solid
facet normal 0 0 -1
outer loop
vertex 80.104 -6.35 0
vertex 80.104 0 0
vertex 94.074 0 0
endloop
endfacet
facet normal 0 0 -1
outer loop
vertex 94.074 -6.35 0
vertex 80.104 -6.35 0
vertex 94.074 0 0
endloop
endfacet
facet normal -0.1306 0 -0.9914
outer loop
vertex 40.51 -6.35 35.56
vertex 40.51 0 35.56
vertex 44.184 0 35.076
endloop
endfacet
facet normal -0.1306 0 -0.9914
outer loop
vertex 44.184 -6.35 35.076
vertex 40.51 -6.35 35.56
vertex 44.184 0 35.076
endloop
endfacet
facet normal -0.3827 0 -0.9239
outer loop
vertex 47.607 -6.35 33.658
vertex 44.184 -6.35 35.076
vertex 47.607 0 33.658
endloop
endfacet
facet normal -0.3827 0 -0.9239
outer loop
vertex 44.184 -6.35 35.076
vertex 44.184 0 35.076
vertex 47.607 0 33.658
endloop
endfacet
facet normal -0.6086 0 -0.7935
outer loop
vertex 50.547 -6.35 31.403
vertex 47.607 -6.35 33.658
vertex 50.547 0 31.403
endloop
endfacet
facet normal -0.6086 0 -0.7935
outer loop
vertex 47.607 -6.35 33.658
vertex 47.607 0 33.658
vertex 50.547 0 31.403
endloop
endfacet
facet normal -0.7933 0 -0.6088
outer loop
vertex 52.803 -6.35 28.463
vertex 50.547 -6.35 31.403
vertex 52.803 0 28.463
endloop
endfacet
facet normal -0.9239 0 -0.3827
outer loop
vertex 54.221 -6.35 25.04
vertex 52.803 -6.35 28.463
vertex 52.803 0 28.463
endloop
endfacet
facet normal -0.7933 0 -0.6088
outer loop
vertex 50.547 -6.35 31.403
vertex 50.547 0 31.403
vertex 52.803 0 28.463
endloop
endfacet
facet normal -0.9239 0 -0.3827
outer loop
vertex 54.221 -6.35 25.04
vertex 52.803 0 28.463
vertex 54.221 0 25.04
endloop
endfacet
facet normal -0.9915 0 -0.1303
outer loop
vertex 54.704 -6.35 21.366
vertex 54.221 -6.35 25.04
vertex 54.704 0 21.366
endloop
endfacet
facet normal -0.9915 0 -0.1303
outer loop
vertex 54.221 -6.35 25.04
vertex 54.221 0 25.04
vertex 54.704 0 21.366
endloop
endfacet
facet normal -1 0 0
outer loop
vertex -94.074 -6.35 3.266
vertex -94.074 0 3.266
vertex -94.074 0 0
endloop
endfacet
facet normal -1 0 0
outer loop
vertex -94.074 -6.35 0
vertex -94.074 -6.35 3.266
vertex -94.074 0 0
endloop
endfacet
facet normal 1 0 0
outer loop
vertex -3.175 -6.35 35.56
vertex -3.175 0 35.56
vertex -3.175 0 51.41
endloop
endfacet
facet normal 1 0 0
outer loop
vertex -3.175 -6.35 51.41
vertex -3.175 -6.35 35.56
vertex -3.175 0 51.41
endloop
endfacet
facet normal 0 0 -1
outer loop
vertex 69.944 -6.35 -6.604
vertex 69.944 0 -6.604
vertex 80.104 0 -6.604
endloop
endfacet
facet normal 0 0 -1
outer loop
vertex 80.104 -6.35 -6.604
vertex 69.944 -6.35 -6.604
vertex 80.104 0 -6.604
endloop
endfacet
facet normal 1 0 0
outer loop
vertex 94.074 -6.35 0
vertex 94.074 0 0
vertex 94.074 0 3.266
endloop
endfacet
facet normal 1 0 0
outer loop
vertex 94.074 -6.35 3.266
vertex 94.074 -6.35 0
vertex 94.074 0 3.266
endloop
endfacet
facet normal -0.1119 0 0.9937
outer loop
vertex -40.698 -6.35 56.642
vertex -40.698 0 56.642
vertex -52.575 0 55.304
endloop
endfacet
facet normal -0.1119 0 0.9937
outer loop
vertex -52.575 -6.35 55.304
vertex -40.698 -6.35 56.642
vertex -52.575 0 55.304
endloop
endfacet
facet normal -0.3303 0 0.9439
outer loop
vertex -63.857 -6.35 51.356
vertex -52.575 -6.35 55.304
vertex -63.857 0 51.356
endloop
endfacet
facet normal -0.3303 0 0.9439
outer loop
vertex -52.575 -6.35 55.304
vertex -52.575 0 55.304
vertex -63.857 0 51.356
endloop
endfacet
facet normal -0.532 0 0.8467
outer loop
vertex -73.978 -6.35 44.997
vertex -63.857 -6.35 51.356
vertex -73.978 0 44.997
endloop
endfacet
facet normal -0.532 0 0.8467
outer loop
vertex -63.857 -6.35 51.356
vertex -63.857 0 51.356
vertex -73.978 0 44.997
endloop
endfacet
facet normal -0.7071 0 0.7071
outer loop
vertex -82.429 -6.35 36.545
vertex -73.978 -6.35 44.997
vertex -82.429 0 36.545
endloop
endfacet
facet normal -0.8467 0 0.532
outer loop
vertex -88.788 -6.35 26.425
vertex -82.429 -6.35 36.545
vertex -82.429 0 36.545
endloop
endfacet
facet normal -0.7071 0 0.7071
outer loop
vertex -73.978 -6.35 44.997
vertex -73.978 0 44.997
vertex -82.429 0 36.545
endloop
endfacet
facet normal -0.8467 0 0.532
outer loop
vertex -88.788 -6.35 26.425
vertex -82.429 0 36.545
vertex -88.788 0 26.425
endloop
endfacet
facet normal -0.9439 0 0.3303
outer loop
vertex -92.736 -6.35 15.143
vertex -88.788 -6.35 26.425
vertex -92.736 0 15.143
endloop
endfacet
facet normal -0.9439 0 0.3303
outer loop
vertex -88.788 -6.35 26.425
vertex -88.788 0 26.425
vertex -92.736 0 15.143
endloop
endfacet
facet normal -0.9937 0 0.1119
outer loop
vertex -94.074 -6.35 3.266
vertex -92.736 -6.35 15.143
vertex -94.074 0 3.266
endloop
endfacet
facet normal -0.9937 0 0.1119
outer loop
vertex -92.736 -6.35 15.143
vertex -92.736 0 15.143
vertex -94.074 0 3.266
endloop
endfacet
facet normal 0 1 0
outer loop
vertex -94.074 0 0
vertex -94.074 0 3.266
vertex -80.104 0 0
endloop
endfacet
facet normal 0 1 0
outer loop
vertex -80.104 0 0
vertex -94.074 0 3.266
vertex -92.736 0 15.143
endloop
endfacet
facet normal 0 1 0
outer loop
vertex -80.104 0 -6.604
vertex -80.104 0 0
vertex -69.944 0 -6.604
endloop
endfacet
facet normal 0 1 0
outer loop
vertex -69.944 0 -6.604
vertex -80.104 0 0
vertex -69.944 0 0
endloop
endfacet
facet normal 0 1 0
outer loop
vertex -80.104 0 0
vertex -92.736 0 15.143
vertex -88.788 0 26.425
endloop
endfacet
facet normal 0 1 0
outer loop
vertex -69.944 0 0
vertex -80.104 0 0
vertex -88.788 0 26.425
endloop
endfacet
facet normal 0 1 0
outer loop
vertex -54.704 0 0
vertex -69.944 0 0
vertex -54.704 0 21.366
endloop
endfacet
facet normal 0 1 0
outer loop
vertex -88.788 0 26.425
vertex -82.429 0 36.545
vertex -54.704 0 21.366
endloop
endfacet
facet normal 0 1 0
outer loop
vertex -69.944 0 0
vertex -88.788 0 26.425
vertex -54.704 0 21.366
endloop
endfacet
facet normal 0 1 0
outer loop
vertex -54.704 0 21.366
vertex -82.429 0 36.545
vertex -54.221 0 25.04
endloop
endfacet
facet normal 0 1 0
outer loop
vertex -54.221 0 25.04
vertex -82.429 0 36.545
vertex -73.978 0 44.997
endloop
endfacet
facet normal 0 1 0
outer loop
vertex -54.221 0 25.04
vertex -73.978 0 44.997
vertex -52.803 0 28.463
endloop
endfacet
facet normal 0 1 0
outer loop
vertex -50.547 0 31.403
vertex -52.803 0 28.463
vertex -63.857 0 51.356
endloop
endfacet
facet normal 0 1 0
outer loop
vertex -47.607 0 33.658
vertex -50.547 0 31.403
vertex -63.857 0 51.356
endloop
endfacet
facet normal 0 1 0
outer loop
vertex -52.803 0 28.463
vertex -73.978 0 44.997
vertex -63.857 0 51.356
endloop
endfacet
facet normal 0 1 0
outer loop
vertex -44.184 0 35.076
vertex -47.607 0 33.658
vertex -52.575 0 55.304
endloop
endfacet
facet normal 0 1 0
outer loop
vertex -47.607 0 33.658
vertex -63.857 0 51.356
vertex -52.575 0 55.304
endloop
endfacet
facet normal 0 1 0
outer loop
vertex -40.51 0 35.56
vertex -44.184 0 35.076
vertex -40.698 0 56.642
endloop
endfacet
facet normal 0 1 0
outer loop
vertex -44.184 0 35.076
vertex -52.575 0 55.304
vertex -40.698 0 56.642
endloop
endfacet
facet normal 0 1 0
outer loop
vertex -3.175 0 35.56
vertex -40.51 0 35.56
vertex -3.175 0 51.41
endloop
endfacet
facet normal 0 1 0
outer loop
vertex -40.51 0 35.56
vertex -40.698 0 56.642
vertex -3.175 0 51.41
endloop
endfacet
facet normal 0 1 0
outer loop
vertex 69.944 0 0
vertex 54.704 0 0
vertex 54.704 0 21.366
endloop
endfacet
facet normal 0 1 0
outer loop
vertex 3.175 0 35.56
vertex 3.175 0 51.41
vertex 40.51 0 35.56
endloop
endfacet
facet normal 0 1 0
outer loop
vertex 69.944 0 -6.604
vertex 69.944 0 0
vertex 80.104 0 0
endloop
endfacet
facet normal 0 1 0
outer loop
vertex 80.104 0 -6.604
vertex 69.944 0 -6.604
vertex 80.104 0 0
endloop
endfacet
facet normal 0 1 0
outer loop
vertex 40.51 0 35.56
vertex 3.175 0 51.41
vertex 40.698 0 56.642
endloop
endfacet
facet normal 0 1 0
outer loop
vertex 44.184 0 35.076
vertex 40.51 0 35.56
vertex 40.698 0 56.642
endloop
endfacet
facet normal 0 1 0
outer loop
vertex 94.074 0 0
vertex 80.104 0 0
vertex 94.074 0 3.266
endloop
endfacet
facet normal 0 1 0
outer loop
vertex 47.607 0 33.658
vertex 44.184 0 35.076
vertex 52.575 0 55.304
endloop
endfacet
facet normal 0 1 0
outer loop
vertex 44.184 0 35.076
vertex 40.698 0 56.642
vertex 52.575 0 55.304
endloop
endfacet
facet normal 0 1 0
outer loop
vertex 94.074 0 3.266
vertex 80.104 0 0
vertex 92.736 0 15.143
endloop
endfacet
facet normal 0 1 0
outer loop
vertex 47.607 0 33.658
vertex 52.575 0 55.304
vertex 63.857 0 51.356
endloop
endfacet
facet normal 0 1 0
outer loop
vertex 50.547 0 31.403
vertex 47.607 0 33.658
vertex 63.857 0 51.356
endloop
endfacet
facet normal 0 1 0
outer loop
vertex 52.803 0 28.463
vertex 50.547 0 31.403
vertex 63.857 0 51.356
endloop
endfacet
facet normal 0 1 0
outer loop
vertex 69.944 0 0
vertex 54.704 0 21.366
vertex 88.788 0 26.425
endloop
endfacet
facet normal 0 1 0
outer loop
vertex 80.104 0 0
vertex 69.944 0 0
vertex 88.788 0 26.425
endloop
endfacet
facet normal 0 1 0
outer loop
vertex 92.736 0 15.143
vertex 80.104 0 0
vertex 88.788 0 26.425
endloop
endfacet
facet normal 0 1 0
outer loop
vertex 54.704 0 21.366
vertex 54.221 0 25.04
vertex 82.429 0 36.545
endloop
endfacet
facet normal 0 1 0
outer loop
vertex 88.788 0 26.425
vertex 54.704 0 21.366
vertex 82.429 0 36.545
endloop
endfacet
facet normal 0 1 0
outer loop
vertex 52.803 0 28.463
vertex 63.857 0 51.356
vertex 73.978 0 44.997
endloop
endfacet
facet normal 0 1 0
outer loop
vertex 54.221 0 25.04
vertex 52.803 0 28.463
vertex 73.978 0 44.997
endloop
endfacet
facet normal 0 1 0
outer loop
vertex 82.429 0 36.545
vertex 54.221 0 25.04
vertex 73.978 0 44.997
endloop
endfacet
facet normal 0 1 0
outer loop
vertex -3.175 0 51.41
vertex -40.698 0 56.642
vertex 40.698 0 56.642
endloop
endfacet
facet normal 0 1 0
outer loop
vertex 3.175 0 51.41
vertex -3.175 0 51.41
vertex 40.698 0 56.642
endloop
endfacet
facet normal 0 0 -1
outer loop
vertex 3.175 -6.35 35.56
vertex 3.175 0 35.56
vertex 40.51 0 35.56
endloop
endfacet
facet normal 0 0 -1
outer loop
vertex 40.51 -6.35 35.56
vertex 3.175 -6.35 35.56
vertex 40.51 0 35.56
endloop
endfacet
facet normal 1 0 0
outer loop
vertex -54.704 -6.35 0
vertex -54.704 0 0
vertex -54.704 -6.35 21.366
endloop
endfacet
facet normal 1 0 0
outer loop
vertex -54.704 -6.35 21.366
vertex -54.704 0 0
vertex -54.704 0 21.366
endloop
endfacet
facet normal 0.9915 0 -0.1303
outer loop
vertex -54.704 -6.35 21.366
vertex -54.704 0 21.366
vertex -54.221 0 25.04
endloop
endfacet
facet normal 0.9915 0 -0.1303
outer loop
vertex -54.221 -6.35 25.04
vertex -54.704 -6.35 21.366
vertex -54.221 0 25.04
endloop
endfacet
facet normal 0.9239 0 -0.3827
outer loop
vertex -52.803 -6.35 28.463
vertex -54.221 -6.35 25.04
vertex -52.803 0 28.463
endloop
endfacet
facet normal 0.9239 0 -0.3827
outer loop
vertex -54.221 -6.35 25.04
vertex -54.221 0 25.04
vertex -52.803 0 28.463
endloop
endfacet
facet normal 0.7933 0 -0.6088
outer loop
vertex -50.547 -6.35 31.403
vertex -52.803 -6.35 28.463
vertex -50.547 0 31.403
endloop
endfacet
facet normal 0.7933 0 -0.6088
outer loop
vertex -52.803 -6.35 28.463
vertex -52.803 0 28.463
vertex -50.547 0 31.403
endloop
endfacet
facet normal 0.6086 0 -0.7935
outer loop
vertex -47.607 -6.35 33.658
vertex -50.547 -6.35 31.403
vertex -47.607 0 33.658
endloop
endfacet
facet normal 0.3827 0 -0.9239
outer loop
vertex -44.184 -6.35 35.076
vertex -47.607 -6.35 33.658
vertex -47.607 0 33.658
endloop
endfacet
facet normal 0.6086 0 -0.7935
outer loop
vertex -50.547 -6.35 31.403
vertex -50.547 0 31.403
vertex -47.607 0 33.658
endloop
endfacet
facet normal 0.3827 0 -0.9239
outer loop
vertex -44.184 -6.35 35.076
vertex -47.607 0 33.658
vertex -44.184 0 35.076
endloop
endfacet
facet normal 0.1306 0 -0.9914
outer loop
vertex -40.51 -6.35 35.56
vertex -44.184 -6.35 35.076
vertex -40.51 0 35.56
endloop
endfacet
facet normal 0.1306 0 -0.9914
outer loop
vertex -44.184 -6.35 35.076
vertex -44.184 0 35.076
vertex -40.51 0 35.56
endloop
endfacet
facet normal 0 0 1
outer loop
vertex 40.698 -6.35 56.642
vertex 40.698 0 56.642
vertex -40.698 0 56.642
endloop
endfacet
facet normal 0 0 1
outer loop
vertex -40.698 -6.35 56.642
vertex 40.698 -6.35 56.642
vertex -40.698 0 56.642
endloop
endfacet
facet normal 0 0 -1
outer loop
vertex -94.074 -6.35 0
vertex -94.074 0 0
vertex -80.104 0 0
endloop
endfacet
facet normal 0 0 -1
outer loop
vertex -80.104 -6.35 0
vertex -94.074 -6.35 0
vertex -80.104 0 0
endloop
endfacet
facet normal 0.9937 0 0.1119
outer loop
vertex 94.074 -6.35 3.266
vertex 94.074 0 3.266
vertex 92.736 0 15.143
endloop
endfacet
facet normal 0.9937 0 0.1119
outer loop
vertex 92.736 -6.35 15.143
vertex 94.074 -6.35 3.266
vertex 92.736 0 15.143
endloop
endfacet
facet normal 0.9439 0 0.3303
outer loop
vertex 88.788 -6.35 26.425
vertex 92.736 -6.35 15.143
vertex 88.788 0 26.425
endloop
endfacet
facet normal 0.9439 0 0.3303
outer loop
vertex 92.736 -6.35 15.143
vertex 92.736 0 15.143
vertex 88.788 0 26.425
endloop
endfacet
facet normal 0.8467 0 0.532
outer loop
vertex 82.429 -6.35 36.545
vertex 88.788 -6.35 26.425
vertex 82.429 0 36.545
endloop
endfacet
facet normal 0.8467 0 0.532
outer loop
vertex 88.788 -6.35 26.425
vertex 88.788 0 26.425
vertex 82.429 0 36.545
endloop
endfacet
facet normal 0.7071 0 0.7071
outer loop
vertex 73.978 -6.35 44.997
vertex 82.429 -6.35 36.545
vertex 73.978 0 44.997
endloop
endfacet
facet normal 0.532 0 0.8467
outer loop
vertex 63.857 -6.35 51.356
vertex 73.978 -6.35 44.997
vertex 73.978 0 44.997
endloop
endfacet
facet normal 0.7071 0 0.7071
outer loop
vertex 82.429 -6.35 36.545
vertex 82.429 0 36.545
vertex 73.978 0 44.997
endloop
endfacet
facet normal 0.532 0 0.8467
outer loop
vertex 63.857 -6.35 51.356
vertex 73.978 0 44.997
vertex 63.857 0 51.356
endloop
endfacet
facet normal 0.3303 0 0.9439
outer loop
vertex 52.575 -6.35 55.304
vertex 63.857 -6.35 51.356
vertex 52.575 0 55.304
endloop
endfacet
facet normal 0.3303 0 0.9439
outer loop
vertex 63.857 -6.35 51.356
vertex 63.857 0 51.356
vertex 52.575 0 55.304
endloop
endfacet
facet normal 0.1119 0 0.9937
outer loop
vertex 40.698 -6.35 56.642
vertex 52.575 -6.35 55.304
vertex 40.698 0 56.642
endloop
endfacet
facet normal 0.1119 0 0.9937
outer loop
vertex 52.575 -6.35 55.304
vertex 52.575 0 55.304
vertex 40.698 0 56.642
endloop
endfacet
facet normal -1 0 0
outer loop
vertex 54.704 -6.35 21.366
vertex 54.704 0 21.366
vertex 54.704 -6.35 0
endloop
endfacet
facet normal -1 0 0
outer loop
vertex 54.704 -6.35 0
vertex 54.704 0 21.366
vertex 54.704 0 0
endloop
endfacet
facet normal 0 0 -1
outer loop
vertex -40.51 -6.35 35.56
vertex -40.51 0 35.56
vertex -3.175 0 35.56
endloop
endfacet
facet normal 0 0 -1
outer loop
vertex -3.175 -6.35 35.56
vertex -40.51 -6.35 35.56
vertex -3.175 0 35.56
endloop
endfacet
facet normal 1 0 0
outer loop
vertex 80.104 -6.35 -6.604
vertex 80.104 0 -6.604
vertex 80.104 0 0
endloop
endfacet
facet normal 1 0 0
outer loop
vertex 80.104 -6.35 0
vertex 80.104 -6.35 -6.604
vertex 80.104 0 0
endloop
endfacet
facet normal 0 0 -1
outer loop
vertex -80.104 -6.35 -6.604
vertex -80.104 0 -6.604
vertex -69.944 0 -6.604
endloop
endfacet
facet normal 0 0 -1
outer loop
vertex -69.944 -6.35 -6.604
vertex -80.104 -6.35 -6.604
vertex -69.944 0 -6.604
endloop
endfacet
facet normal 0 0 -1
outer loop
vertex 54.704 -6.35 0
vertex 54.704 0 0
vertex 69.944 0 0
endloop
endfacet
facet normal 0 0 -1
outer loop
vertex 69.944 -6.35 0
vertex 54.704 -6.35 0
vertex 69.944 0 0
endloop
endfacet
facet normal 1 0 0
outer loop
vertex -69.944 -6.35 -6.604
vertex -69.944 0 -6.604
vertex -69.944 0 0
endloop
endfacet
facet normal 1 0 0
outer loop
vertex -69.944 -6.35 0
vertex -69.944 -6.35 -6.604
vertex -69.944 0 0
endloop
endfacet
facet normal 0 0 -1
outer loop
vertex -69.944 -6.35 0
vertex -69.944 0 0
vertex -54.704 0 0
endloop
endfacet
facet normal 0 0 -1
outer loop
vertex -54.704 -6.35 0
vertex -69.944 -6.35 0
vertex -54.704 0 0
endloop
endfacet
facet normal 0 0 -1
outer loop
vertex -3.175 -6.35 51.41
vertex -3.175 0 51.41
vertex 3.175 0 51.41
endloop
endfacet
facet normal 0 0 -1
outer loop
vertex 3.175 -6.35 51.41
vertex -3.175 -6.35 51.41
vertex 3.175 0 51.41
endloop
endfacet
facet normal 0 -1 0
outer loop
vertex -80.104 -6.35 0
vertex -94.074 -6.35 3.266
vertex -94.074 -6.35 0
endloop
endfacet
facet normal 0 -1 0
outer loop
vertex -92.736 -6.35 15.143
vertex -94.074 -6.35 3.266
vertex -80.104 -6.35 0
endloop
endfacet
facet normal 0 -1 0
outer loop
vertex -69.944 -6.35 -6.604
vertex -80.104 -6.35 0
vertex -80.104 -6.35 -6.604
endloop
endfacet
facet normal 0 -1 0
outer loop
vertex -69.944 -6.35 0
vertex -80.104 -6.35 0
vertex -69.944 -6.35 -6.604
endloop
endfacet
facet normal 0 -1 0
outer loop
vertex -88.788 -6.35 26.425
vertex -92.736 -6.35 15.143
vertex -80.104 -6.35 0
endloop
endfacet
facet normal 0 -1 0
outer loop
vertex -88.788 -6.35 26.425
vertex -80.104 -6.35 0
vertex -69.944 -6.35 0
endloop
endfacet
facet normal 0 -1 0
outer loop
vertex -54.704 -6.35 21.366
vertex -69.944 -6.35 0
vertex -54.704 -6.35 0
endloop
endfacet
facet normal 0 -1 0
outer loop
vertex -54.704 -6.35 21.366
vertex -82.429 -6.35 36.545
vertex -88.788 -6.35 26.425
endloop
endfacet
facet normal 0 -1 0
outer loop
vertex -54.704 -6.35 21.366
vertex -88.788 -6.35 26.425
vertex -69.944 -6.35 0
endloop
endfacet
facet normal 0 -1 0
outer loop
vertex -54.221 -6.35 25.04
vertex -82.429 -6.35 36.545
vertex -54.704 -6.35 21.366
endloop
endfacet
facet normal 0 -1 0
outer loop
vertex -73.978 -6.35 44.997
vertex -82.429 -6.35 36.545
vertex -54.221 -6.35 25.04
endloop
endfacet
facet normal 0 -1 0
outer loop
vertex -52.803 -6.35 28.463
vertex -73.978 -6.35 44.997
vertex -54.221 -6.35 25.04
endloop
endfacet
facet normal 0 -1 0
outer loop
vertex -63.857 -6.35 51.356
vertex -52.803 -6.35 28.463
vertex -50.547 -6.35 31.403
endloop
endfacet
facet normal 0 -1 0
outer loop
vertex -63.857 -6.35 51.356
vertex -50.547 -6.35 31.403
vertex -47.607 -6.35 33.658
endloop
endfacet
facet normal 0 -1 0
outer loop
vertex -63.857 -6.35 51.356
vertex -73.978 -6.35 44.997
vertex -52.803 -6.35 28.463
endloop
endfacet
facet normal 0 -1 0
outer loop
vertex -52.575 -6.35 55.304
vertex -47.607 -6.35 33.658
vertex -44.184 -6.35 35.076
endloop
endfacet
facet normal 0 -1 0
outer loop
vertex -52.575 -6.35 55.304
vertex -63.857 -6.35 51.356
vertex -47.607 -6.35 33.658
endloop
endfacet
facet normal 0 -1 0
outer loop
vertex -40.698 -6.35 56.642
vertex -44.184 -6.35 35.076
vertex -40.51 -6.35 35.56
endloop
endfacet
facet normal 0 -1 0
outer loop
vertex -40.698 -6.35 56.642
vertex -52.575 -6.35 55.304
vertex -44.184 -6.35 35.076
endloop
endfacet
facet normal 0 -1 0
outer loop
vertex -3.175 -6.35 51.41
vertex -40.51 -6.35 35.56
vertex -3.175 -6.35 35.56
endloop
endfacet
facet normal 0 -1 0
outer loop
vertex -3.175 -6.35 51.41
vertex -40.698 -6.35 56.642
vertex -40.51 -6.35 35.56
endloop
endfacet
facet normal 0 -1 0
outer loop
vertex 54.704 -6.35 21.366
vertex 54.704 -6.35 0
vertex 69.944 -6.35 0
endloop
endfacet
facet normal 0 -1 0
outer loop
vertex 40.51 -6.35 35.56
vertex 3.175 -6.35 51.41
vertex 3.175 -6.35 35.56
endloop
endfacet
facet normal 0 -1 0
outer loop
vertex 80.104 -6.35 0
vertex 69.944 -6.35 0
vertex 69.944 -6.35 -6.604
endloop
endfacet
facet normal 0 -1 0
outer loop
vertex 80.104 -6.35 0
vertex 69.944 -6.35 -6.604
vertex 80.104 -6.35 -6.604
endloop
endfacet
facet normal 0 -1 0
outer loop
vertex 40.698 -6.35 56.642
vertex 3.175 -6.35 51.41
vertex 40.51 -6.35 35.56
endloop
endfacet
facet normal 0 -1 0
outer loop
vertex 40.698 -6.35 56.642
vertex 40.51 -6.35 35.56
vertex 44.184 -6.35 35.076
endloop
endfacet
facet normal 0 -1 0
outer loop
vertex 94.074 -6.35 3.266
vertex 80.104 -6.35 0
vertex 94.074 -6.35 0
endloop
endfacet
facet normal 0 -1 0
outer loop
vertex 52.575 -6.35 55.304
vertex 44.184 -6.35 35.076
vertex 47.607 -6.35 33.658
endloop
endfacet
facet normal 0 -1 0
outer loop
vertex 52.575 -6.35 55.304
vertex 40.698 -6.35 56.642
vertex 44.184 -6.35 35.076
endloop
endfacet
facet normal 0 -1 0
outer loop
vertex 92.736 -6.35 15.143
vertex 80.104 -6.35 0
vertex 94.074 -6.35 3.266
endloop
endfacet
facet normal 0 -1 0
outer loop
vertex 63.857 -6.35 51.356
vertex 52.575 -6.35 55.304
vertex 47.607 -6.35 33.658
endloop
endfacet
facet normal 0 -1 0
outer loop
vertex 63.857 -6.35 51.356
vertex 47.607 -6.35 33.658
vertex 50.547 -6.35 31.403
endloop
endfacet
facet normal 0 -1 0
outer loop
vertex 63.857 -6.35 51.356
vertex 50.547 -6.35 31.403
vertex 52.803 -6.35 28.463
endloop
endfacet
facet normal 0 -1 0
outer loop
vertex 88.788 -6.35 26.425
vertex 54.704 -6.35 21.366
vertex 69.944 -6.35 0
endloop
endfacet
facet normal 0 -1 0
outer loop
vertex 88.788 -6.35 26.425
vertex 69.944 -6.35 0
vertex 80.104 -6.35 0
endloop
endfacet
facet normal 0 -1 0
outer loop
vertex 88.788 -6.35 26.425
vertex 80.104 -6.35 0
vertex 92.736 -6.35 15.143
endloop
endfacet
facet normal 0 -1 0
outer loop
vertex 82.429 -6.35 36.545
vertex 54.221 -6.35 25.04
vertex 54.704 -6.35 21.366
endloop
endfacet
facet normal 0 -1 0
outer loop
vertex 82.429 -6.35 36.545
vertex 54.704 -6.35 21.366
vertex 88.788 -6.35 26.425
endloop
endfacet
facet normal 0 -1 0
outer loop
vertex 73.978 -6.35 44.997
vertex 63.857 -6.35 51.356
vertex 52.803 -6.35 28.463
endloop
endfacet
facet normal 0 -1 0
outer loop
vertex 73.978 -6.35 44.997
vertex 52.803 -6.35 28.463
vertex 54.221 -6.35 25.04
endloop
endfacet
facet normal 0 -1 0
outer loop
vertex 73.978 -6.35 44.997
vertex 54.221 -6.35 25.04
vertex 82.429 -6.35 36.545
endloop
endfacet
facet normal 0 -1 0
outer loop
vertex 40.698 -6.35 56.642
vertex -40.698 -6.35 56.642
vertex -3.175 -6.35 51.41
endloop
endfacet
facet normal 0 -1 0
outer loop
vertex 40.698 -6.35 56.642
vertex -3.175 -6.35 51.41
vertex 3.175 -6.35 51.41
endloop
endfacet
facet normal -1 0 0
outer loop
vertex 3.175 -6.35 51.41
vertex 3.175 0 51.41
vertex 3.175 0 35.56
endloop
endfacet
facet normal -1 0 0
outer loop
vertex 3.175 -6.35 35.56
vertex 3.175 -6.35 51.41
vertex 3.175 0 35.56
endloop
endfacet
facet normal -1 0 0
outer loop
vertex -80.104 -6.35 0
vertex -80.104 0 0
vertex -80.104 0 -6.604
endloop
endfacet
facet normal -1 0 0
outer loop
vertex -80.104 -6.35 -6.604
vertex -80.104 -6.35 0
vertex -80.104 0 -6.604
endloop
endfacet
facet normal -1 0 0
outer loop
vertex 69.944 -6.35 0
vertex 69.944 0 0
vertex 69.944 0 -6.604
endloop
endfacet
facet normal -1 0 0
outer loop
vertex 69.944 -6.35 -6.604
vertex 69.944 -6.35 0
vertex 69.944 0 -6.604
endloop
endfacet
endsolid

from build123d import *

# Parameters (mm, degrees)
F1_DEPTH = 6.35


with BuildPart() as f1:
    # F0 (on Front) → F1 (new body)
    with BuildSketch(Plane.XZ):
        with BuildLine():
            Line((-69.944234, -6.604), (-69.944234, 0))
            Line((-69.944234, 0), (-54.704234, 0))
            Line((-54.704234, 0), (-54.704234, 21.365997))
            ThreePointArc((-54.704234, 21.365997), (-50.546907, 31.402673), (-40.510231, 35.56))
            Line((-40.510231, 35.56), (-3.175, 35.56))
            Line((-3.175, 35.56), (-3.175, 51.4096))
            Line((-3.175, 51.4096), (3.175, 51.4096))
            Line((3.175, 51.4096), (3.175, 35.56))
            Line((3.175, 35.56), (40.510231, 35.56))
            ThreePointArc((40.510231, 35.56), (50.546907, 31.402673), (54.704234, 21.365997))
            Line((54.704234, 21.365997), (54.704234, 0))
            Line((54.704234, 0), (69.944234, 0))
            Line((69.944234, 0), (69.944234, -6.604))
            Line((69.944234, -6.604), (80.104234, -6.604))
            Line((80.104234, -6.604), (80.104234, 0))
            Line((80.104234, 0), (94.074234, 0))
            Line((94.074234, 0), (94.074234, 3.265747))
            ThreePointArc((94.074234, 3.265747), (78.440691, 41.008457), (40.697981, 56.642))
            Line((40.697981, 56.642), (-40.697981, 56.642))
            ThreePointArc((-40.697981, 56.642), (-78.440691, 41.008457), (-94.074234, 3.265747))
            Line((-94.074234, 3.265747), (-94.074234, 0))
            Line((-94.074234, 0), (-80.104234, 0))
            Line((-80.104234, 0), (-80.104234, -6.604))
            Line((-80.104234, -6.604), (-69.944234, -6.604))
        make_face()
    extrude(amount=F1_DEPTH)


solid = f1.part
